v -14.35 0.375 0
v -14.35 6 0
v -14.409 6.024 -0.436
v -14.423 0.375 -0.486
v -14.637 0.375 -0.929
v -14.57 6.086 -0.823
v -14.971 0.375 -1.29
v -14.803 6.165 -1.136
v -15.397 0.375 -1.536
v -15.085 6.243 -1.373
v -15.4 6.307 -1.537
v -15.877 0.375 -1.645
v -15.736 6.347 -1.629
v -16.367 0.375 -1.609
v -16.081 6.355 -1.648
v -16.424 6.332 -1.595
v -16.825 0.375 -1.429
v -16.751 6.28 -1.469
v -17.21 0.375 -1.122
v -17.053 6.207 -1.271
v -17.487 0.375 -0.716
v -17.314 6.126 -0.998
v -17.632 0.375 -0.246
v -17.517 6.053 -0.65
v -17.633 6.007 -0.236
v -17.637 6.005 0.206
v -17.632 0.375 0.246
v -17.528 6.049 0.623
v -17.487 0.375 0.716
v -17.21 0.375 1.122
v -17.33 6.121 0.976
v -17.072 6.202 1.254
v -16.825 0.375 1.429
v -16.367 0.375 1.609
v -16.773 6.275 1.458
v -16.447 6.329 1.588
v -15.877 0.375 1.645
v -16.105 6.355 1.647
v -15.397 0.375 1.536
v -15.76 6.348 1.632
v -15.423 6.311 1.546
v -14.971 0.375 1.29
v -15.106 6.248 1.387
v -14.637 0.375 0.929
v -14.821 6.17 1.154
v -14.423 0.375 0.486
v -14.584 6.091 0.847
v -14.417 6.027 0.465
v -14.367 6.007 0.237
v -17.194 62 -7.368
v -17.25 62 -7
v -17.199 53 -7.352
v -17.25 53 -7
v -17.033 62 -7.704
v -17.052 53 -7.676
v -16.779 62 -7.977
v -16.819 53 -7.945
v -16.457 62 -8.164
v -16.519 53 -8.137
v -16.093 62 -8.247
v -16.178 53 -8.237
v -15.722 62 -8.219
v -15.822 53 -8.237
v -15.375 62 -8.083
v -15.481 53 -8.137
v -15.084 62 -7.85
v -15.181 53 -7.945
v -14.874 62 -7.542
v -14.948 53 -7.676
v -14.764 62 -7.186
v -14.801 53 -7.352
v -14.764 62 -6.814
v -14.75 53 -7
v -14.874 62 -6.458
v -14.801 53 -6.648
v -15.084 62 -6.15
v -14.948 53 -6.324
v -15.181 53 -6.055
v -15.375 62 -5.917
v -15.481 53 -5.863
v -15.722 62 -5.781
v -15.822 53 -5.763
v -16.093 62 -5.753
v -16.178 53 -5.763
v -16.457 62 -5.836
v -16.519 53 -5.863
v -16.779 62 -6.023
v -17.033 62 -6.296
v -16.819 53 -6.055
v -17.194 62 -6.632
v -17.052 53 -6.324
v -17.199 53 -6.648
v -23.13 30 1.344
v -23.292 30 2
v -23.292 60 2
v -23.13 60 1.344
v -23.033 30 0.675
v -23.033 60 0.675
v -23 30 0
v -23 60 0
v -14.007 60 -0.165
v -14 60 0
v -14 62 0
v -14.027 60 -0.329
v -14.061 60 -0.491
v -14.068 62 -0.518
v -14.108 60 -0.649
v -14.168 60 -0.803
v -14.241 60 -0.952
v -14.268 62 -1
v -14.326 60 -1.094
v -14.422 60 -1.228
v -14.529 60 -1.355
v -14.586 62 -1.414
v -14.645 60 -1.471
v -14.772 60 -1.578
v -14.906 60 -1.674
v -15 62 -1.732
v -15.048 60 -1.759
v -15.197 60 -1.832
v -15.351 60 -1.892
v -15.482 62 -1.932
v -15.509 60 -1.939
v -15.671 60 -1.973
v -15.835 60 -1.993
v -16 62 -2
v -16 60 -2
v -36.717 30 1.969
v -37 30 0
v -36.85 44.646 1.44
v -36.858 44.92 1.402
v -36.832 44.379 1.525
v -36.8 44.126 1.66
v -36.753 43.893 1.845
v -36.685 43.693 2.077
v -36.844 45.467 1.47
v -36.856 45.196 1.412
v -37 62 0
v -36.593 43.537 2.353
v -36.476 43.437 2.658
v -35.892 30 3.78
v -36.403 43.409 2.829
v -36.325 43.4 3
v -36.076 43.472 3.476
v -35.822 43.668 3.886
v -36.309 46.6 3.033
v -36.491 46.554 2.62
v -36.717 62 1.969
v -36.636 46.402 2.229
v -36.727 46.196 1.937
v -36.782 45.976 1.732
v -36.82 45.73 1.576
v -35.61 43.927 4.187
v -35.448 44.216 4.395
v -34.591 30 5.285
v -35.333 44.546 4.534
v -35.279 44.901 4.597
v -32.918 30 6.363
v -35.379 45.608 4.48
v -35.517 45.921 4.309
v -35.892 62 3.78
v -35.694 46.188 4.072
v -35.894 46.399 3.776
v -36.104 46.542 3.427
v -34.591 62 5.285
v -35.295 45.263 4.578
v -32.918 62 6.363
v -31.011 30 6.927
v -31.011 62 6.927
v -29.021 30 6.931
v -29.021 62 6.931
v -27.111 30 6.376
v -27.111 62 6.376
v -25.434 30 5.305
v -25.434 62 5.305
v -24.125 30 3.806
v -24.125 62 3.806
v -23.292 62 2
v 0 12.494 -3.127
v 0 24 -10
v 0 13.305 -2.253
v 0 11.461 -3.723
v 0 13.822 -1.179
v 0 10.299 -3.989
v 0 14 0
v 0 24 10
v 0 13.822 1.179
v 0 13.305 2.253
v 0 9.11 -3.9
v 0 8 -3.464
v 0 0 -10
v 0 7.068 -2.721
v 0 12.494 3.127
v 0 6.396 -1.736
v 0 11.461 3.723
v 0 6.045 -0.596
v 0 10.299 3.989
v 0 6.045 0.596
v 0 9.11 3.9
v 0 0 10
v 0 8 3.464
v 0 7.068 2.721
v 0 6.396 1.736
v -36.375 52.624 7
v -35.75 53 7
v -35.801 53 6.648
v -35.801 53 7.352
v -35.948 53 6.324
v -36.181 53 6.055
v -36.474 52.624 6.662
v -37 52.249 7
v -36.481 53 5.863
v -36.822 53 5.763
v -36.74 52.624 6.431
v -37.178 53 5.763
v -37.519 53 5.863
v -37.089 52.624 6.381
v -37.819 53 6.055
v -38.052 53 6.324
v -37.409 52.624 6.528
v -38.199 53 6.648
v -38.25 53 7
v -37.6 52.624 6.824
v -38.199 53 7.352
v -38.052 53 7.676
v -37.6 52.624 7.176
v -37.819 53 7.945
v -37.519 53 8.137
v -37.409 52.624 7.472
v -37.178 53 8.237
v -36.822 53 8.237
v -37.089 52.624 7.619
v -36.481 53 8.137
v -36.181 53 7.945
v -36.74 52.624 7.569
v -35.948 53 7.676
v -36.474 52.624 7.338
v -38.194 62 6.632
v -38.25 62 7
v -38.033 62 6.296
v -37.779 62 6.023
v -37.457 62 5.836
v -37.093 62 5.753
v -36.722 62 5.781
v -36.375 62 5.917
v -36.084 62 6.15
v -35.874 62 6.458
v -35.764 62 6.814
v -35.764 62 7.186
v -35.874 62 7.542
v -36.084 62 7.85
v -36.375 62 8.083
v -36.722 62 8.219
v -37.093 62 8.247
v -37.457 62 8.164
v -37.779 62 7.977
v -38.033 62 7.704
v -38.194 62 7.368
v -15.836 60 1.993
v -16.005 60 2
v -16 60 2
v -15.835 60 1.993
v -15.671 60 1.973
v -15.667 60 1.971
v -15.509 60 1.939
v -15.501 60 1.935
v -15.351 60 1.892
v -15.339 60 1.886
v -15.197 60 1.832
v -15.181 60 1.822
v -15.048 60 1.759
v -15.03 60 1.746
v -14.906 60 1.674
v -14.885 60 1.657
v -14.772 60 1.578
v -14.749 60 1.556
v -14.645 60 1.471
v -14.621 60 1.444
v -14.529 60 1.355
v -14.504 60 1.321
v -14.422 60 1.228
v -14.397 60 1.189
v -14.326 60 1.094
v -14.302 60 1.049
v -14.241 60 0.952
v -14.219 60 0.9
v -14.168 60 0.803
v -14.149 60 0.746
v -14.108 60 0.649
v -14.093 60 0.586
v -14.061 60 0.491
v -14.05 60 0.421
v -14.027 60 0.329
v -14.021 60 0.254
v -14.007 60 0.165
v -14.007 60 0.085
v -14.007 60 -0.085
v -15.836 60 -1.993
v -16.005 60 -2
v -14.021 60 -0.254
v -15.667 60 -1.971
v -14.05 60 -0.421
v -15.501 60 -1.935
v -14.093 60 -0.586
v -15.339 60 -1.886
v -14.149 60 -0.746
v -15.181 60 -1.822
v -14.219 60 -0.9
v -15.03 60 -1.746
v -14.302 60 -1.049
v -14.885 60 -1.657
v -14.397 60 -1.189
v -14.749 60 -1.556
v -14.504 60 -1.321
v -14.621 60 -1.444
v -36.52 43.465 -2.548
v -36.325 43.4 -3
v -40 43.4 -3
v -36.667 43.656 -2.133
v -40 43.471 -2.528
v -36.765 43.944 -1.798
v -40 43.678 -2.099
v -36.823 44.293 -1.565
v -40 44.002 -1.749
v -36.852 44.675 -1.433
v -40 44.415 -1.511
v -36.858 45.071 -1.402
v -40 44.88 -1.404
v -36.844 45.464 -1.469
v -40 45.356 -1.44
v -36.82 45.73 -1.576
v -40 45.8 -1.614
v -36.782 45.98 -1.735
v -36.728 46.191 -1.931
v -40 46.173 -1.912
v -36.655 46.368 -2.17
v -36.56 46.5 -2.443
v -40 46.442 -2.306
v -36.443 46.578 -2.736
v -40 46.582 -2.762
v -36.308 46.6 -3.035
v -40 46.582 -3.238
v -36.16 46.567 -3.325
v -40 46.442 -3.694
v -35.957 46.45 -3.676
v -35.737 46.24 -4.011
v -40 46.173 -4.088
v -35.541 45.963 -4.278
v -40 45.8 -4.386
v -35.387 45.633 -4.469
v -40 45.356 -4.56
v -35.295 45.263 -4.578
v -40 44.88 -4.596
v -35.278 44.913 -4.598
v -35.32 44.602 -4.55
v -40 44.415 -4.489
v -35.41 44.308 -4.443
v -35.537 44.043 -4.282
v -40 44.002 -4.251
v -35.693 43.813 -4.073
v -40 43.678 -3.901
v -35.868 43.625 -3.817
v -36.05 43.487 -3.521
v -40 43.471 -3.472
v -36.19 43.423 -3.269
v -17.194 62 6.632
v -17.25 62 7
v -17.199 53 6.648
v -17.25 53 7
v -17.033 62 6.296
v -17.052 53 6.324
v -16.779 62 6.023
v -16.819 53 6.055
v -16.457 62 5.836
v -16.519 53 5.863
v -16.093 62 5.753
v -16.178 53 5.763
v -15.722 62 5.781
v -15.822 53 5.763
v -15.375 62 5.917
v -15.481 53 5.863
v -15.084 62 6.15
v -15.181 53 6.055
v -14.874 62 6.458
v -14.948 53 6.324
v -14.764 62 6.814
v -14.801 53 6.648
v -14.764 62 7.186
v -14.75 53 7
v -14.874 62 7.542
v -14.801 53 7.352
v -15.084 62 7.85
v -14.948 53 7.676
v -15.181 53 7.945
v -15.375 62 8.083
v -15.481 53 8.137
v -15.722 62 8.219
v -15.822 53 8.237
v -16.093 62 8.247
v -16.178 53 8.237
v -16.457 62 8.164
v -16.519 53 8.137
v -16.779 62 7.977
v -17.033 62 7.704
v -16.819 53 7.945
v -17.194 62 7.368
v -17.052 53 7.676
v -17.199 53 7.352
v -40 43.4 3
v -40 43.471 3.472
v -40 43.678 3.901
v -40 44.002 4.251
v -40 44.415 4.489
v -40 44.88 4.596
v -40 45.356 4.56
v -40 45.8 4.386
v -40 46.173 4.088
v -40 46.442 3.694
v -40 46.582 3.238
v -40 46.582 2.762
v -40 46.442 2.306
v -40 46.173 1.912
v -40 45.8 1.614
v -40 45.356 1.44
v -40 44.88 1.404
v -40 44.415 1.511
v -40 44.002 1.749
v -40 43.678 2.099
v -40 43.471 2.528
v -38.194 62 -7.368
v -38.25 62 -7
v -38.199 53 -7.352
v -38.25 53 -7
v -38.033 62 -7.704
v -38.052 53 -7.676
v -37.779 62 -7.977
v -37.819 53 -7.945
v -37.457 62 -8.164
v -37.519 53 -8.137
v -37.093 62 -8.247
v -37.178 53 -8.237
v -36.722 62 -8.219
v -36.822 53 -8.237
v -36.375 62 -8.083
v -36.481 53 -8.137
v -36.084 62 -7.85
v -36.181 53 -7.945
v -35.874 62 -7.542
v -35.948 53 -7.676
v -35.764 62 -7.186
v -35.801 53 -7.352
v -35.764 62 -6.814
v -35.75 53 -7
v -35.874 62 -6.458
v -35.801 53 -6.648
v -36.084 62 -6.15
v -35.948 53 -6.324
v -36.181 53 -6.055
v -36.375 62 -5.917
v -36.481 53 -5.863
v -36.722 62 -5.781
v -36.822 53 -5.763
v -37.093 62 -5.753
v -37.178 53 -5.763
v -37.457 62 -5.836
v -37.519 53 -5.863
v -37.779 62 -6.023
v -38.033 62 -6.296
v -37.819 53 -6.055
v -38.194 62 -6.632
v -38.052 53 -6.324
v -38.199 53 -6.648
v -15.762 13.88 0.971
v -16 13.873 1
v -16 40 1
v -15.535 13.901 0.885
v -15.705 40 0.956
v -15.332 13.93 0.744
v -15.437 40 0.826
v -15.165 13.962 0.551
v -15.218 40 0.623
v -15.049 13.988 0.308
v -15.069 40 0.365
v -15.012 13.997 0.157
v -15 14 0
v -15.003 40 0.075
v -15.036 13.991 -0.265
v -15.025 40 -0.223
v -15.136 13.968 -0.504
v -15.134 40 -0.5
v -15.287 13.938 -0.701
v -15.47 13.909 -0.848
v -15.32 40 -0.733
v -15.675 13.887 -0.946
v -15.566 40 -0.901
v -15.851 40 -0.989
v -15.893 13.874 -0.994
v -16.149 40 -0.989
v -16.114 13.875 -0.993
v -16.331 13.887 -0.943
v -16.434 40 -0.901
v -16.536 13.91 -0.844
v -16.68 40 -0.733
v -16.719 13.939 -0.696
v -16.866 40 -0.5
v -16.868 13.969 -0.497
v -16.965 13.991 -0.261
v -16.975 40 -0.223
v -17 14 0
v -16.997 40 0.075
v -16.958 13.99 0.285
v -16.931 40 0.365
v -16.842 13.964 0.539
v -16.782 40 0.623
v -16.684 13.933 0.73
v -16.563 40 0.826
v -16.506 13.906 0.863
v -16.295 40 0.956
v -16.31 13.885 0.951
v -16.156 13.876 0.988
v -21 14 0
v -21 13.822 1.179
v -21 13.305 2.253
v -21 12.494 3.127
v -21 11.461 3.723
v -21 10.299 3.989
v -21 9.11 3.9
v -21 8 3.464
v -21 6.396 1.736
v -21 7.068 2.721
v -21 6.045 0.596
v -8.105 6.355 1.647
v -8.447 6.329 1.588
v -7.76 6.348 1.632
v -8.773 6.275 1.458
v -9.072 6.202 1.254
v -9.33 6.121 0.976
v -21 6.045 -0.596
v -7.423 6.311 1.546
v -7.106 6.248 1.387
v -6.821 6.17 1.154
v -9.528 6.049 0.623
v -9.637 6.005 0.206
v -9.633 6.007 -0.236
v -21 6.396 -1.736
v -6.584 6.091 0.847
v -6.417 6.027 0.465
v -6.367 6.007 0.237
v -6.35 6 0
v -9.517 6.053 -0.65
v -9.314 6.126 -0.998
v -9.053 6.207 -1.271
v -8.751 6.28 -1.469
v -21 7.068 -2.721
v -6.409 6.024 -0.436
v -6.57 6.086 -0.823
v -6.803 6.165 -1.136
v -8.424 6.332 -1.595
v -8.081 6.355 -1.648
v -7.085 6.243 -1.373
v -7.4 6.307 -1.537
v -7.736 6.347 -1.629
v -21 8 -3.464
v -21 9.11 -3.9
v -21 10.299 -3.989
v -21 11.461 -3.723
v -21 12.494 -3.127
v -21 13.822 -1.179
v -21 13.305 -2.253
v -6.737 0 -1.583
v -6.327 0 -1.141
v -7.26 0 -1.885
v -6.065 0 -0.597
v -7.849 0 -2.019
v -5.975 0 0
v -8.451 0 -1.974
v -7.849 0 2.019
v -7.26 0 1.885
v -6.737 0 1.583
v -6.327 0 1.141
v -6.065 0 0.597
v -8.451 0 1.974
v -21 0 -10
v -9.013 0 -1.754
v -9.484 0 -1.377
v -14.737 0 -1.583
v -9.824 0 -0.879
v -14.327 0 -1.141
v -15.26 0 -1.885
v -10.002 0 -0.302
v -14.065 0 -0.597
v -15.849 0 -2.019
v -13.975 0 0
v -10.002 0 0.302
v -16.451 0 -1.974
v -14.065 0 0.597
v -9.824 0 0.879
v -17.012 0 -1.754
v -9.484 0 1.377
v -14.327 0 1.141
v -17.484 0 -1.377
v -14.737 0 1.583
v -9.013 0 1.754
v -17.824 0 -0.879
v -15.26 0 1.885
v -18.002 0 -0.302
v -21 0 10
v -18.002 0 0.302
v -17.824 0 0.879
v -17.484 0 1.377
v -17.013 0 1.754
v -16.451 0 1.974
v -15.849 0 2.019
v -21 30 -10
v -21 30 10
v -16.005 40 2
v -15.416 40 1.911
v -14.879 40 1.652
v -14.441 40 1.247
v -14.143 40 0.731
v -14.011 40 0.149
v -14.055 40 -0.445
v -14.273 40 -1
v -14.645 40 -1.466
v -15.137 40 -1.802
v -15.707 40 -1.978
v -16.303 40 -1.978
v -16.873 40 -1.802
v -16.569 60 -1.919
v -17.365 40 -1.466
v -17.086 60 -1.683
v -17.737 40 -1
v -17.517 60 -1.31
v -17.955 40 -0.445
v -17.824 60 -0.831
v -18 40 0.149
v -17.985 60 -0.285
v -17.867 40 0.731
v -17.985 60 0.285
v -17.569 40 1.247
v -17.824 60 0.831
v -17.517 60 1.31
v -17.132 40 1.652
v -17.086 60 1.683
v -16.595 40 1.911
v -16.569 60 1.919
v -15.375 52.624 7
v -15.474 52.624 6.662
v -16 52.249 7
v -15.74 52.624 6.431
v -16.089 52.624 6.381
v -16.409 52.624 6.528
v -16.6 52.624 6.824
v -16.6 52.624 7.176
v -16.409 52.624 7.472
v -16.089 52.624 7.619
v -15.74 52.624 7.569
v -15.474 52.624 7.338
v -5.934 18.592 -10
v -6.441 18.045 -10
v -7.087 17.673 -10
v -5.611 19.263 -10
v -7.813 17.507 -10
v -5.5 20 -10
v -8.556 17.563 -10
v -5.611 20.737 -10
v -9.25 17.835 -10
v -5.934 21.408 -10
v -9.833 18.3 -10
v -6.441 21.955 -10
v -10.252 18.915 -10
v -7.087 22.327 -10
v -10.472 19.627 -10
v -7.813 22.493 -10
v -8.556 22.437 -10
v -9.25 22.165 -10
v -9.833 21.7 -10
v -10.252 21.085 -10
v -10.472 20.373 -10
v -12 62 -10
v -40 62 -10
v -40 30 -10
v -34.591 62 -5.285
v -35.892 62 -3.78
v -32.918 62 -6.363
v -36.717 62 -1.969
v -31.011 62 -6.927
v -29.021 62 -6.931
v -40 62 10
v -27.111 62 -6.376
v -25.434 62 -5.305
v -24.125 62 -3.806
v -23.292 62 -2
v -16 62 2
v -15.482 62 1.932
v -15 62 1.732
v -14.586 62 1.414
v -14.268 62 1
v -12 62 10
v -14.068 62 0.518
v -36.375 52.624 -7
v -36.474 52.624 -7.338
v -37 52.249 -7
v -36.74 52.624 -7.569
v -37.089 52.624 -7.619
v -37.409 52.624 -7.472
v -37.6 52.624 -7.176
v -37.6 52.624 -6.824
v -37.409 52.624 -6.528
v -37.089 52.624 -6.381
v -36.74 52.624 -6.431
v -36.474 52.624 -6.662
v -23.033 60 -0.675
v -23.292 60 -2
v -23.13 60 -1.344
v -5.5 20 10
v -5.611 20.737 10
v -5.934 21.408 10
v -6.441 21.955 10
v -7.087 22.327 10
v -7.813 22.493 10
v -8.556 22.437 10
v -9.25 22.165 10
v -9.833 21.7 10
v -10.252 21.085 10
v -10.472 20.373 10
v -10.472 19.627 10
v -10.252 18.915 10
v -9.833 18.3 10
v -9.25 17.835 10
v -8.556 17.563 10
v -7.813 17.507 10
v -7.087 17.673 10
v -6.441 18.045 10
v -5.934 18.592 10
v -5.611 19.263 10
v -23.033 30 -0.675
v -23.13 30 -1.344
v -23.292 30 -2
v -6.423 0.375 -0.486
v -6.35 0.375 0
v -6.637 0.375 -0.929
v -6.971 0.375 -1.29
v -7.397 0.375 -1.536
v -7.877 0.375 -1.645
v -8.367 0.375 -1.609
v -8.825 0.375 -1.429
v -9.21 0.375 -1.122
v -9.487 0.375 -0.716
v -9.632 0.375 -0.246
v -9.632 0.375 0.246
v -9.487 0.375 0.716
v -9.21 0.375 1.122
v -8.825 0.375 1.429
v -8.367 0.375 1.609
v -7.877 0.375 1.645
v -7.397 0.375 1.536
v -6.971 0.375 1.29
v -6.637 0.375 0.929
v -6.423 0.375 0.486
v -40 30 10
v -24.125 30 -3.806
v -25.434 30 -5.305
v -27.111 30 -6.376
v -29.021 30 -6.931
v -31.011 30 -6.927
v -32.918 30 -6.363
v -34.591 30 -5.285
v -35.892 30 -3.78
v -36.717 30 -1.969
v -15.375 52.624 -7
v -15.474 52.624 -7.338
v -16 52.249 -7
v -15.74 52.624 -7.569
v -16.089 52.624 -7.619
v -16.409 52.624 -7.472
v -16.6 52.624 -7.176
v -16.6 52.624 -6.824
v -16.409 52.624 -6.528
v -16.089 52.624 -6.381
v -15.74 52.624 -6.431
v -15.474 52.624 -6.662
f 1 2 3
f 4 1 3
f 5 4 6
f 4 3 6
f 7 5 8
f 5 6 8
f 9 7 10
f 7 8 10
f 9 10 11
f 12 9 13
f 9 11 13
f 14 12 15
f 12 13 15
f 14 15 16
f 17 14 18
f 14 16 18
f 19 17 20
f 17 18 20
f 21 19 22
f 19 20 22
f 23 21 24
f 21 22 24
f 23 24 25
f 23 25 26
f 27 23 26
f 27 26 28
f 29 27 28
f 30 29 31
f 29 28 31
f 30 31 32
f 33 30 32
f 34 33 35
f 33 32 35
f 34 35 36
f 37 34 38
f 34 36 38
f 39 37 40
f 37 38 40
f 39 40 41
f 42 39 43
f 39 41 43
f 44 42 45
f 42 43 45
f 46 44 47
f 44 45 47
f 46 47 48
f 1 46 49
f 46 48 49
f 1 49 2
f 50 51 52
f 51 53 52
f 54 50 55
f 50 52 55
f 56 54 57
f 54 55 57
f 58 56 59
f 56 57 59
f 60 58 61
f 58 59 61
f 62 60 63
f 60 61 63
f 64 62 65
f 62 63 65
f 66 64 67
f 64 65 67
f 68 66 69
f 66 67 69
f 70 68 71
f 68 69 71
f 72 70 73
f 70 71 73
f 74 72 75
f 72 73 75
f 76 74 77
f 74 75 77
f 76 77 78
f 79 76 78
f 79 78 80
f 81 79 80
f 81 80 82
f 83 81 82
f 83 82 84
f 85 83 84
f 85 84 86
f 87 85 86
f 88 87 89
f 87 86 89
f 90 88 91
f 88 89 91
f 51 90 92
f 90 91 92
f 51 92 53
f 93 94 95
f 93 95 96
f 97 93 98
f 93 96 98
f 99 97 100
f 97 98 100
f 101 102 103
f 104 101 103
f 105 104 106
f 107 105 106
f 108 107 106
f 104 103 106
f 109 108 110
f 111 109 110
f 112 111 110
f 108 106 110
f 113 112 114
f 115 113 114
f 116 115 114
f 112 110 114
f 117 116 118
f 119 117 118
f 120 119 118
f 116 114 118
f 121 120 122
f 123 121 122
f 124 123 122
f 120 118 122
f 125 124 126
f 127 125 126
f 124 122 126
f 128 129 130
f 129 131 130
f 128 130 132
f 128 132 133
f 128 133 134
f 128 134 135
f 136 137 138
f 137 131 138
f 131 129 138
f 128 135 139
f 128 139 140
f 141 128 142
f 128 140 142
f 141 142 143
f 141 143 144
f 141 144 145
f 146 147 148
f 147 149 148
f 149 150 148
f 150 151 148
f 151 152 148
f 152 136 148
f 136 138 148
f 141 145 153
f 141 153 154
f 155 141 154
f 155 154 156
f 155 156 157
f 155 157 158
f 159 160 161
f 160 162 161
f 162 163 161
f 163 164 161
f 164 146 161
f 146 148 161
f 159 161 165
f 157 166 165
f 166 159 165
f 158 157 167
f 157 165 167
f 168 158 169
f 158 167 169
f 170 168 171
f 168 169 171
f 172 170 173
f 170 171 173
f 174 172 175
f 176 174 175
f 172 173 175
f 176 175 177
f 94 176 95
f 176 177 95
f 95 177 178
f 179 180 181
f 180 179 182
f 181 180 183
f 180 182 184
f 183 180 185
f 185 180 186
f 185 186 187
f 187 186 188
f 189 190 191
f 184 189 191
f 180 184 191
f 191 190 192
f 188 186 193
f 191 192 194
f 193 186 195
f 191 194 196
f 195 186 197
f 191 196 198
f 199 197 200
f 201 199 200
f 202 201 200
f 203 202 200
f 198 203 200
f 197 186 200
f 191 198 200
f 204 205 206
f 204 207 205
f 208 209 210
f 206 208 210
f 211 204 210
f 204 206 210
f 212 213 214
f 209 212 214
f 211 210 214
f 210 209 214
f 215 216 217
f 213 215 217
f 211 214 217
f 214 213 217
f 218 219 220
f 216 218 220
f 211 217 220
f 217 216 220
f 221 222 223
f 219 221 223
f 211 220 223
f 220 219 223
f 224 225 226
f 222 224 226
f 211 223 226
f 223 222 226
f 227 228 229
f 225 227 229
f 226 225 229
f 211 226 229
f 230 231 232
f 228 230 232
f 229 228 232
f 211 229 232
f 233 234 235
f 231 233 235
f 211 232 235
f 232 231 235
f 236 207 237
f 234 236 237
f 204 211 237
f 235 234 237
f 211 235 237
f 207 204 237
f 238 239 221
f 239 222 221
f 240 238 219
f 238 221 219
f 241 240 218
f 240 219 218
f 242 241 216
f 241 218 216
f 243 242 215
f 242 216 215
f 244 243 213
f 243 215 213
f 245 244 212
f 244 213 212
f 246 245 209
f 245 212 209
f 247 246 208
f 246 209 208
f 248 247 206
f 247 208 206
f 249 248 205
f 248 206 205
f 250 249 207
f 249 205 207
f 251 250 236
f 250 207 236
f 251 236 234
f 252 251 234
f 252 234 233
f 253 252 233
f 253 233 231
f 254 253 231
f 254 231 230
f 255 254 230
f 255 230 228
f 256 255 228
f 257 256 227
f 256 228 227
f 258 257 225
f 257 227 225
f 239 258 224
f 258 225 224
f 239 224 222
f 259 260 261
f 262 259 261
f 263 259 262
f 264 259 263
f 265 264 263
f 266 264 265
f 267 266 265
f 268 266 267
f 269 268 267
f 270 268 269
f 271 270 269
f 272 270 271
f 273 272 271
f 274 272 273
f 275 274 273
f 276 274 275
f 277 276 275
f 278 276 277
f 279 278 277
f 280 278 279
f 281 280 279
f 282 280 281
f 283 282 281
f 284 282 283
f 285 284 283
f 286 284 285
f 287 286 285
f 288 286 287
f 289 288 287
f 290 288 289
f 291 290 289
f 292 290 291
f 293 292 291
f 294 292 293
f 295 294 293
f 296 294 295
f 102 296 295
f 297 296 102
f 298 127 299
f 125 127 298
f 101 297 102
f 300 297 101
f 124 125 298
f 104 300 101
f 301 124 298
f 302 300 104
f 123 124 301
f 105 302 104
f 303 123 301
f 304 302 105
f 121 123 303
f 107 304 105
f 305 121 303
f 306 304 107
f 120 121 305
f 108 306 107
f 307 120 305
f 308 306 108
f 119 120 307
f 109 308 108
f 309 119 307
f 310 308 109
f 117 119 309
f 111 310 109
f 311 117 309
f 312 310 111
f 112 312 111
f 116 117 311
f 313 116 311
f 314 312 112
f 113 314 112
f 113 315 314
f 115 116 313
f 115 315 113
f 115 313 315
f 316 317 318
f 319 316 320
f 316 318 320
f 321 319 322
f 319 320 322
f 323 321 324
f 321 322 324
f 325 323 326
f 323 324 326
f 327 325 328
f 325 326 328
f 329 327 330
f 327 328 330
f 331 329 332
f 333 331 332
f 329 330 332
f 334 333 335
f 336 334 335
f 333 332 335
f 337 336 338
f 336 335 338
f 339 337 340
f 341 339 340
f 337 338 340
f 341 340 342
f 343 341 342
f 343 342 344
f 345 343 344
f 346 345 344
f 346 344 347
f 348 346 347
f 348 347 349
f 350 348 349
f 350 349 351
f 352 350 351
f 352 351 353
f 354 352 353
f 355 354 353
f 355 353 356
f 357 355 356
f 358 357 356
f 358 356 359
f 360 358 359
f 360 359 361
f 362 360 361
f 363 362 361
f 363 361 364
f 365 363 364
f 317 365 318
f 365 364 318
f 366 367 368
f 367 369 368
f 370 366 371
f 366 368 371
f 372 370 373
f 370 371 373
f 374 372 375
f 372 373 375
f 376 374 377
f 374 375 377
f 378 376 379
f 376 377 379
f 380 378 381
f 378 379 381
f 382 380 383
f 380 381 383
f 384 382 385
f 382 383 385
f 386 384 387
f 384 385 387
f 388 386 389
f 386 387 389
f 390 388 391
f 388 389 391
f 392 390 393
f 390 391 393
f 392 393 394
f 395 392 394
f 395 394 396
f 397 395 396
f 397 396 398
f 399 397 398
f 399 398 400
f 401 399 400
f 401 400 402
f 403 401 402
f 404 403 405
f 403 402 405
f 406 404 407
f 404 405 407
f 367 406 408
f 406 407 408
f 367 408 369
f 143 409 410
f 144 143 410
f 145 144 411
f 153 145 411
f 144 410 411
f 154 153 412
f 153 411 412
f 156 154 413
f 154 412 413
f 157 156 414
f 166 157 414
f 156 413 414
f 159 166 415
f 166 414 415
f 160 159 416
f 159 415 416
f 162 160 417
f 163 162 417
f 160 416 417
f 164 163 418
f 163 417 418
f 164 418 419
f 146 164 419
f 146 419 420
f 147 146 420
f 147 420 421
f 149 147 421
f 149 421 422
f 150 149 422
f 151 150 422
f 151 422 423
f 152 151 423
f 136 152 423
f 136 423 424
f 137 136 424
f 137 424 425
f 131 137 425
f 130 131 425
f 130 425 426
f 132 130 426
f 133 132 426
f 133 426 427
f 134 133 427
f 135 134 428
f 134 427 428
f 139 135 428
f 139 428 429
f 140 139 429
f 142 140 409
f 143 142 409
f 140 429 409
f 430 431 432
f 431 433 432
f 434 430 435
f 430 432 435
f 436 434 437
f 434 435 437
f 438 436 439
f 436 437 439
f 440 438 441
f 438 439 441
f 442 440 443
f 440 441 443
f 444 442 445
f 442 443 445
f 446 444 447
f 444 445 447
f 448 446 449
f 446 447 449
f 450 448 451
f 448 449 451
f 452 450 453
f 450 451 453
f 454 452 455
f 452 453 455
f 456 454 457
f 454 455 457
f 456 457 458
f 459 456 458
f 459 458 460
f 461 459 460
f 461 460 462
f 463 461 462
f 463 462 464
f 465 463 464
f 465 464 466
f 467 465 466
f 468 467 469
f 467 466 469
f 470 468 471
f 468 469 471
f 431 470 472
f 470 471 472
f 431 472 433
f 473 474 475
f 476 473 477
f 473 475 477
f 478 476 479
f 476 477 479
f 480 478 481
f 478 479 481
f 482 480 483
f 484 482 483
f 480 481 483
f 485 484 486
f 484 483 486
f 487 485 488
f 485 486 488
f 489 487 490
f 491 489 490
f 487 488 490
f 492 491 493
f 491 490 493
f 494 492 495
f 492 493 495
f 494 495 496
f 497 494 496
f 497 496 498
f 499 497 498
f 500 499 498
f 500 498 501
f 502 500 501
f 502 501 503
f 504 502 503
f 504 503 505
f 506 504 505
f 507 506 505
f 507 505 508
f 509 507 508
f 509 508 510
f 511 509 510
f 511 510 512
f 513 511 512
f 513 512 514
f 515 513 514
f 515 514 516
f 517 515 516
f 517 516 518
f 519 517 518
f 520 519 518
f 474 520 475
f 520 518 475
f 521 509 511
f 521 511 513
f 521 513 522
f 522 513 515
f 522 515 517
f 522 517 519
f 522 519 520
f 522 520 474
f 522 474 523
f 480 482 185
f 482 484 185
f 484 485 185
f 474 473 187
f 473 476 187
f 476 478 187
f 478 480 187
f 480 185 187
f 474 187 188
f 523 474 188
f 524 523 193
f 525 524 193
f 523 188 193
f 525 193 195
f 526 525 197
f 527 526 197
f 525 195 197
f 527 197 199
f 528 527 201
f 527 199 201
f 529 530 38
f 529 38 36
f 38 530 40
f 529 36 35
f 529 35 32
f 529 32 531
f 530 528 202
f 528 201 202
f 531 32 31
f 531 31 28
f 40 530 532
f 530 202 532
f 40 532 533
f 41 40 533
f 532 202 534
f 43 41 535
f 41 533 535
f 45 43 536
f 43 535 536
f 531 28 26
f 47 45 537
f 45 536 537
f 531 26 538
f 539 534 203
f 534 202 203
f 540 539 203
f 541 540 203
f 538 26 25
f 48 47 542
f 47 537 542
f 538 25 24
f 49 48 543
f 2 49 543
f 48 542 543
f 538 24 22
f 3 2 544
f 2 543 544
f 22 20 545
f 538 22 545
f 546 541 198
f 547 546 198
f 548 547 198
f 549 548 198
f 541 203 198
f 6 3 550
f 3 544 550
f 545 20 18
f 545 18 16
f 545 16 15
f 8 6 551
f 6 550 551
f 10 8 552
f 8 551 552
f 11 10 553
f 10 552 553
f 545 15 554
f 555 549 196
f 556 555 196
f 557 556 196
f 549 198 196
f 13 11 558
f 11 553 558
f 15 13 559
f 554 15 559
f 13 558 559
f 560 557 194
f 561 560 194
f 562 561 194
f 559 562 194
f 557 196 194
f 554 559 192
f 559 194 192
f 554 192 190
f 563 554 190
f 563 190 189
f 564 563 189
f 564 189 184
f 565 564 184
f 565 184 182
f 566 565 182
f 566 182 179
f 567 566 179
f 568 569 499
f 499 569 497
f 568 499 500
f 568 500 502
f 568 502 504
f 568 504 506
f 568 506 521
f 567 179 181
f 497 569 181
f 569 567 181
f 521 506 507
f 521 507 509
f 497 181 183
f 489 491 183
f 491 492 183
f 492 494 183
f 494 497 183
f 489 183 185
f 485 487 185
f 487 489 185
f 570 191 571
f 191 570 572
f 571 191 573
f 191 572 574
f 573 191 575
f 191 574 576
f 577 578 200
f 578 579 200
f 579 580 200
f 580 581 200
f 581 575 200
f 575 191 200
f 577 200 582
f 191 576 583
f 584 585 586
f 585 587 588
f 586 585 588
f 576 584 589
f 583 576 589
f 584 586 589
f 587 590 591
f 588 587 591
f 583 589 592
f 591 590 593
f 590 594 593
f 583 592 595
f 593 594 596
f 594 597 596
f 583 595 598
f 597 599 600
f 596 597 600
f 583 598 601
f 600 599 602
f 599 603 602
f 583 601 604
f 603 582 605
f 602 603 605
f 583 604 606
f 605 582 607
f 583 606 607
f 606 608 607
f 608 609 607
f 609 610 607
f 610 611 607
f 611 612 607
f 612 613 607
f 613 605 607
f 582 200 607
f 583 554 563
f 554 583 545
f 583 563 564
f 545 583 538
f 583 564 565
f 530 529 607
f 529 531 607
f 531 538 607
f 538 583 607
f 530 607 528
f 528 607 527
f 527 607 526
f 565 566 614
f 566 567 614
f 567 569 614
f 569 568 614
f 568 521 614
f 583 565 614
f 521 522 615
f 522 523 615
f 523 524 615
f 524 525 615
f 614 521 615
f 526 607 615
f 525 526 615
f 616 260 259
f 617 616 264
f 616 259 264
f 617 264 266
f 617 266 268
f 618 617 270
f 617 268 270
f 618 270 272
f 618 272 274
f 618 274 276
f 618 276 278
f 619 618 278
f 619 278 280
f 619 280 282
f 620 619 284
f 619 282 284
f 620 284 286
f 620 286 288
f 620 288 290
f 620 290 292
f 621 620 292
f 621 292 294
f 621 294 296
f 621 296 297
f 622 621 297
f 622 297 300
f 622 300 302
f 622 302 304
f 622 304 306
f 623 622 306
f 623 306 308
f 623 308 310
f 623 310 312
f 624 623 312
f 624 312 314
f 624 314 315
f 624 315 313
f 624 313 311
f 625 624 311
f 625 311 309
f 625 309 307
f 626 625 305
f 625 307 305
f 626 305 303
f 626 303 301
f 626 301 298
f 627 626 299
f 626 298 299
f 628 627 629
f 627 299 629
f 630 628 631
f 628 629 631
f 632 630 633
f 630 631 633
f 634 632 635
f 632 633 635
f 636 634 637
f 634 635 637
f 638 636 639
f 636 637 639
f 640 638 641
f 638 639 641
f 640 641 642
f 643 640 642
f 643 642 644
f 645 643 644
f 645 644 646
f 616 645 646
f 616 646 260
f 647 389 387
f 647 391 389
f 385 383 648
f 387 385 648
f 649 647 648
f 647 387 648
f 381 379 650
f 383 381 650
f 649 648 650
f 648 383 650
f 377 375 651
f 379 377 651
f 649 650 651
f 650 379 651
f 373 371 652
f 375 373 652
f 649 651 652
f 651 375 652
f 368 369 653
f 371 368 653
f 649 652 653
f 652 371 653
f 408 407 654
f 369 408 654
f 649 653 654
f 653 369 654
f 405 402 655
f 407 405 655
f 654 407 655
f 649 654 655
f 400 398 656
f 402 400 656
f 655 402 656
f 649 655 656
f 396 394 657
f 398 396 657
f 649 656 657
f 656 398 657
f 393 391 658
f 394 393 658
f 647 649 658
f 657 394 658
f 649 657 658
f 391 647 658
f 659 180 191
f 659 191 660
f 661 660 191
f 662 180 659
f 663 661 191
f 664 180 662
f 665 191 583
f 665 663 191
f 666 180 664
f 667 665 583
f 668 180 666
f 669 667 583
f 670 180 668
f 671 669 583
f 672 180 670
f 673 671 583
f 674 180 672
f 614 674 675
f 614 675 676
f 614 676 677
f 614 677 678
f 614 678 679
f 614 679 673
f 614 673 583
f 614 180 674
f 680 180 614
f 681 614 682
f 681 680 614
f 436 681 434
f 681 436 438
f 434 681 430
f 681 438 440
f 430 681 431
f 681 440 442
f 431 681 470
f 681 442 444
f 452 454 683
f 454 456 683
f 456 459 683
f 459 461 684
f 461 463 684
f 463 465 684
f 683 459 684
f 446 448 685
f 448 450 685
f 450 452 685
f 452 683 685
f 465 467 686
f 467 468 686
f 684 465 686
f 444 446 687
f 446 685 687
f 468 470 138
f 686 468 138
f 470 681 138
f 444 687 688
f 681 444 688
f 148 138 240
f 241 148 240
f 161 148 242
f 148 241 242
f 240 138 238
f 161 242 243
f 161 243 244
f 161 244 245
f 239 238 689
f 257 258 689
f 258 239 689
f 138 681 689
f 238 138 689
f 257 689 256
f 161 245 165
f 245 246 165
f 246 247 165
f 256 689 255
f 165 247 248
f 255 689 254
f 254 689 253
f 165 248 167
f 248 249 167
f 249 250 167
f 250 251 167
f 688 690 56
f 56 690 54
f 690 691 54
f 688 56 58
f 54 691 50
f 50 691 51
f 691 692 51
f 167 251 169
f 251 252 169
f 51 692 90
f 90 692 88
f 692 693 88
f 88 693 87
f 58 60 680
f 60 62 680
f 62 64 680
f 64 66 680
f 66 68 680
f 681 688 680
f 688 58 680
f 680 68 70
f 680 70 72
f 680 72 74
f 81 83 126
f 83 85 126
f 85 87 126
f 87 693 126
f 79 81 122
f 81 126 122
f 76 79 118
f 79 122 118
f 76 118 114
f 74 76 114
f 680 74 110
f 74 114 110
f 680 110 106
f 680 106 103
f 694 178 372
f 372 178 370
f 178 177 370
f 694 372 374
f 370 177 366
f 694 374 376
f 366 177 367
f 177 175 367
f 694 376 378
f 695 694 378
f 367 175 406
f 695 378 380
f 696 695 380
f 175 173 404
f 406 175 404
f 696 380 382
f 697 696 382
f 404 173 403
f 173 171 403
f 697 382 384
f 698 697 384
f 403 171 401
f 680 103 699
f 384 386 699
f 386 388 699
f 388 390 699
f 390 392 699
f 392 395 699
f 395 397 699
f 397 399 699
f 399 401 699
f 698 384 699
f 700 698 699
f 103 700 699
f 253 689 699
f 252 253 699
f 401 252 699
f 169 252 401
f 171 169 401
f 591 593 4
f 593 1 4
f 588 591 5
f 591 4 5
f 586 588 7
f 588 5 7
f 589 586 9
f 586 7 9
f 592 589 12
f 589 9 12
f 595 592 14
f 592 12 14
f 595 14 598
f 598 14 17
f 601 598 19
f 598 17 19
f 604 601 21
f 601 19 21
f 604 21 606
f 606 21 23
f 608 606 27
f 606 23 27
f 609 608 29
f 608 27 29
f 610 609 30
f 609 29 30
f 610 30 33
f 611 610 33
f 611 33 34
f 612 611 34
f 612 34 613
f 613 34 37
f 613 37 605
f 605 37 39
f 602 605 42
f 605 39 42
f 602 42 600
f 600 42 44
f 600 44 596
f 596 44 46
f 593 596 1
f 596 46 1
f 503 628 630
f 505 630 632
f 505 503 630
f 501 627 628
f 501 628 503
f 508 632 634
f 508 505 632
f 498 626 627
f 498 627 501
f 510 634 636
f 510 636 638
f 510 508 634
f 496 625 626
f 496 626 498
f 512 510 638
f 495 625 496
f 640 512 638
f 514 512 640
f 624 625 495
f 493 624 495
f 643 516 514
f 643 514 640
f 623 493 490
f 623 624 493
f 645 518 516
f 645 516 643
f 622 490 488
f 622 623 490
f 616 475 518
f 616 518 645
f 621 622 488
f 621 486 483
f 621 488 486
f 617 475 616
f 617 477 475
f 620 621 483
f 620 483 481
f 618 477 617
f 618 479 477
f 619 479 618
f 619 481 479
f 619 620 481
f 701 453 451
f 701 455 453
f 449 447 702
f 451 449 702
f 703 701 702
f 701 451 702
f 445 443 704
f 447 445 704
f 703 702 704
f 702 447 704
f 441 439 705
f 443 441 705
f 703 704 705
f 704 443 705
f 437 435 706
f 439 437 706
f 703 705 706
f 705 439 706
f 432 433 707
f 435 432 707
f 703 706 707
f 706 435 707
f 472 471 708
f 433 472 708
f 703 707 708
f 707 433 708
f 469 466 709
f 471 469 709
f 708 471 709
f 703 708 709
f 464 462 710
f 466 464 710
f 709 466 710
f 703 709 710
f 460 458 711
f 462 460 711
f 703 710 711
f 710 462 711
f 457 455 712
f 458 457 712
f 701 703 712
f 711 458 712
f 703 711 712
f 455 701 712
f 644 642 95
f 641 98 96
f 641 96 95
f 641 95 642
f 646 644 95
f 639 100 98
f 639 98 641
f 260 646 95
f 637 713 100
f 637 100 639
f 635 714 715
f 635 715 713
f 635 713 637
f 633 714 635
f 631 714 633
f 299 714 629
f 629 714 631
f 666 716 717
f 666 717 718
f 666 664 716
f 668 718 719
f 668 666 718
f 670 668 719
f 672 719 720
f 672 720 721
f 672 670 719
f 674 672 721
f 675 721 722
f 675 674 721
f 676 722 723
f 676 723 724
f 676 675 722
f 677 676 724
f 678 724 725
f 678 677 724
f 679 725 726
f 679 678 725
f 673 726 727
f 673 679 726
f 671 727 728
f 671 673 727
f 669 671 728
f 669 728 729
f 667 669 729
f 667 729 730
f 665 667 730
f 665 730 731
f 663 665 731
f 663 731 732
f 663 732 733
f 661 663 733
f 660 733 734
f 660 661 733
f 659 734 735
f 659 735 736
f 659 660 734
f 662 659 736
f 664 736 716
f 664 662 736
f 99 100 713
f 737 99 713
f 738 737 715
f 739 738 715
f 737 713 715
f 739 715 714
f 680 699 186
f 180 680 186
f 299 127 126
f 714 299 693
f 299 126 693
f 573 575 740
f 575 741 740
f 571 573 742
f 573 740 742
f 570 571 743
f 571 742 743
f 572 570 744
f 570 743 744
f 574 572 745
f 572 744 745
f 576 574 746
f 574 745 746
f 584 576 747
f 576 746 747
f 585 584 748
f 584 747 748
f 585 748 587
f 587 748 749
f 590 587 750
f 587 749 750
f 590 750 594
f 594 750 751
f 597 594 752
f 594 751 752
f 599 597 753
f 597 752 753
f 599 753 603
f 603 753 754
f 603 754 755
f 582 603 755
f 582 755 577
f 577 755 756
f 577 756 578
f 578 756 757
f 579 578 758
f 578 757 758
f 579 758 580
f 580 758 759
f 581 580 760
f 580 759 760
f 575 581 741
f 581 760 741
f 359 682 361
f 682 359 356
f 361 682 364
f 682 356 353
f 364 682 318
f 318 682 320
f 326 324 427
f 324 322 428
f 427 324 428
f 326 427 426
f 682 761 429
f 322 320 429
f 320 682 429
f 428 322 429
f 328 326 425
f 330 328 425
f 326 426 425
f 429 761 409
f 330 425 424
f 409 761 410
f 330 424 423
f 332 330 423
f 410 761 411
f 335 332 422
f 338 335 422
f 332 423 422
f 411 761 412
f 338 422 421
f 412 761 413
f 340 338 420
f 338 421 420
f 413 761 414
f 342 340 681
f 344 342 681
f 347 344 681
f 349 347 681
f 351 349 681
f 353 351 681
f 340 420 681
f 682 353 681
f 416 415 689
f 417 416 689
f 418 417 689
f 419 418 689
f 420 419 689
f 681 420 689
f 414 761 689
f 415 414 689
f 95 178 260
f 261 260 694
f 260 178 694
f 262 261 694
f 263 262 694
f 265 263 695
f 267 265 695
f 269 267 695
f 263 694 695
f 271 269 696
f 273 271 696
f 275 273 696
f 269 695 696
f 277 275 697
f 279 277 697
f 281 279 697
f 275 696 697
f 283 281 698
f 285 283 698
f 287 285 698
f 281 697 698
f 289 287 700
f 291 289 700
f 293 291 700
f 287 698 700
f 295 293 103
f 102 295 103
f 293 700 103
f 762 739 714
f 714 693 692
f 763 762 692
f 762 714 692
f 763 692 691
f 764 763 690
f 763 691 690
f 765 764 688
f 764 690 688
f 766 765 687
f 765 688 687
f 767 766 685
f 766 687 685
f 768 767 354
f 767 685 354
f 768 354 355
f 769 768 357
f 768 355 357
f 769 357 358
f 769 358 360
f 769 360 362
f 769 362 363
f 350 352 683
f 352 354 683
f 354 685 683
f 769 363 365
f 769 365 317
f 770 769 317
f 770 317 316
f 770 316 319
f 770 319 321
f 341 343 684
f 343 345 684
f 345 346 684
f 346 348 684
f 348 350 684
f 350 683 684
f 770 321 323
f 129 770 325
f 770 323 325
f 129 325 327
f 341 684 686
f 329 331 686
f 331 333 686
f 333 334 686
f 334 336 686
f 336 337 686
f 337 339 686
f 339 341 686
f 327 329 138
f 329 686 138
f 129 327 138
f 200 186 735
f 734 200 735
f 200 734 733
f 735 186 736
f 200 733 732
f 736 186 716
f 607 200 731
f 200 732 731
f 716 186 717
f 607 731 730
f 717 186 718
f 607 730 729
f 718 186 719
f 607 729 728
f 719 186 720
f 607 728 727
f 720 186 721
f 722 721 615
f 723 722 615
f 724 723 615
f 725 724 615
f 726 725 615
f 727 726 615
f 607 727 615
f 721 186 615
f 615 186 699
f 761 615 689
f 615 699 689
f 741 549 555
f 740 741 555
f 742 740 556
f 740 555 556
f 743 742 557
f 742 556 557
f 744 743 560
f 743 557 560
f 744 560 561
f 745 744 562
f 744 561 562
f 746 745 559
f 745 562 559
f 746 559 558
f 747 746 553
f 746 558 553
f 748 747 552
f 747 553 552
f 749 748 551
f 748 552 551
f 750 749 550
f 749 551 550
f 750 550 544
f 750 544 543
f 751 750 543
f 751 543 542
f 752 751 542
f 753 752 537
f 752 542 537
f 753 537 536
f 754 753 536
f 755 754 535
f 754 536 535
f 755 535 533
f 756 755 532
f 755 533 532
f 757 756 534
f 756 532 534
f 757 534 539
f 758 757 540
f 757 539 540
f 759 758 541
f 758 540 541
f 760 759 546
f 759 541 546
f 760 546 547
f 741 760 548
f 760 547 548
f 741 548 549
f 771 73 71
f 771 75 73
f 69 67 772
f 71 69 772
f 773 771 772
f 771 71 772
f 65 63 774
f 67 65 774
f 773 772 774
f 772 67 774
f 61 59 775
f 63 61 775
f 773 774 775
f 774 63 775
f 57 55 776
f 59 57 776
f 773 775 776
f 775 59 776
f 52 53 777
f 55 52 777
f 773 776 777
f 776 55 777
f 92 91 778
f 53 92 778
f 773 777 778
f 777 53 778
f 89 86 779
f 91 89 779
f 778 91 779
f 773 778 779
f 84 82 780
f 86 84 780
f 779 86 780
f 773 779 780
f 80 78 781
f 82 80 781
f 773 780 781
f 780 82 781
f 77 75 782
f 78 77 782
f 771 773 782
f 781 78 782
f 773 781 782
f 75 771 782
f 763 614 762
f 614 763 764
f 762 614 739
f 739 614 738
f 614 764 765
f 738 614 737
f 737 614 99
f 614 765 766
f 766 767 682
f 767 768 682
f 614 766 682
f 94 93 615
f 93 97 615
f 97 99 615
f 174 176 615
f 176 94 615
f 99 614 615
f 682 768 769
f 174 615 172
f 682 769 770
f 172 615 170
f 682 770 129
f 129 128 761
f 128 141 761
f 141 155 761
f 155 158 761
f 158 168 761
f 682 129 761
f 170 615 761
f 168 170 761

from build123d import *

# Parameters (mm, degrees)
SKETCH1_R             = 2.5
BOSS_EXTRUDE1_DEPTH   = 10
CUT_EXTRUDE1_DEPTH    = 75.458041876
CUT_EXTRUDE2_DEPTH    = 2
M3_TAPPED_HOLE1_D     = 2.5
M3_TAPPED_HOLE1_DEPTH = 9
M3_TAPPED_HOLE1_TIP   = 0.751075774
SKETCH6_R             = 4
CUT_EXTRUDE3_DEPTH    = 75.458041876
SKETCH10_R            = 1.6
CUT_EXTRUDE4_DEPTH    = 8
SKETCH11_R            = 2
CUT_EXTRUDE5_DEPTH    = 20
SKETCH12_R            = 1
CUT_EXTRUDE6_DEPTH    = 29


# Read off the part's stored shape, not the designer's step: M4 Tapped Hole1
with BuildPart() as part:
    # Sketch1 → Boss-Extrude1 (new, symmetric)
    with BuildSketch(Plane.XY):
        Polygon((0, 0), (-21, 0), (-21, 30), (-40, 30), (-40, 62), (-12, 62), (0, 24), align=None)
        with Locations((-8, 20)):
            Circle(SKETCH1_R, mode=Mode.SUBTRACT)
    extrude(amount=BOSS_EXTRUDE1_DEPTH, both=True)

    # Sketch2 → Cut-Extrude1 (cut, through all)
    with BuildSketch(Plane(origin=(0, 62, 0), x_dir=(1, 0, 0), z_dir=(0, 1, 0))):
        with BuildLine():
            ThreePointArc((-23.291796068, -2), (-23.073333142, -1.010587075), (-23, 0))
            Line((-23, 0), (-37, 0))
            ThreePointArc((-37, 0), (-31.010587075, -6.926666858), (-23.291796068, -2))
        make_face()
        with BuildLine():
            Line((-37, 0), (-23, 0))
            ThreePointArc((-23, 0), (-23.073333142, 1.010587075), (-23.291796068, 2))
            ThreePointArc((-23.291796068, 2), (-31.010587075, 6.926666858), (-37, 0))
        make_face()
    extrude(amount=-CUT_EXTRUDE1_DEPTH, mode=Mode.SUBTRACT)

    # Sketch2<3> → Cut-Extrude2 (cut)
    with BuildSketch(Plane(origin=(0, 62, 0), x_dir=(1, 0, 0), z_dir=(0, 1, 0))):
        with BuildLine():
            ThreePointArc((-16, -2), (-17.414213562, -1.414213562), (-18, 0))
            Line((-18, 0), (-23, 0))
            ThreePointArc((-23, 0), (-23.073333142, -1.010587075), (-23.291796068, -2))
            Line((-23.291796068, -2), (-16, -2))
        make_face()
        with BuildLine():
            Line((-23, 0), (-18, 0))
            ThreePointArc((-18, 0), (-17.414213562, 1.414213562), (-16, 2))
            Line((-16, 2), (-23.291796068, 2))
            ThreePointArc((-23.291796068, 2), (-23.073333142, 1.010587075), (-23, 0))
        make_face()
        with BuildLine():
            ThreePointArc((-16, -2), (-14.585786438, -1.414213562), (-14, 0))
            Line((-14, 0), (-18, 0))
            ThreePointArc((-18, 0), (-17.414213562, -1.414213562), (-16, -2))
        make_face()
        with BuildLine():
            Line((-18, 0), (-14, 0))
            ThreePointArc((-14, 0), (-14.585786438, 1.414213562), (-16, 2))
            ThreePointArc((-16, 2), (-17.414213562, 1.414213562), (-18, 0))
        make_face()
    extrude(amount=-CUT_EXTRUDE2_DEPTH, mode=Mode.SUBTRACT)

    # M3 Tapped Hole1
    with Locations(Plane(origin=(0, 62, 0), x_dir=(1, 0, 0), z_dir=(0, 1, 0))):
        with Locations((-37, 7), (-37, -7), (-16, -7), (-16, 7)):
            Hole(M3_TAPPED_HOLE1_D / 2, depth=M3_TAPPED_HOLE1_DEPTH)
            with Locations((0, 0, -(M3_TAPPED_HOLE1_DEPTH + M3_TAPPED_HOLE1_TIP / 2))):  # 118° drill point
                Cone(0, M3_TAPPED_HOLE1_D / 2, M3_TAPPED_HOLE1_TIP, mode=Mode.SUBTRACT)

    # Sketch6 → Cut-Extrude3 (cut, through all)
    with BuildSketch(Plane(origin=(0, 0, 0), x_dir=(0, 0, -1), z_dir=(1, 0, 0))):
        with Locations(Location((0, 10, 0), (0, 0, 90))):
            Circle(SKETCH6_R)
    extrude(amount=-CUT_EXTRUDE3_DEPTH, mode=Mode.SUBTRACT)

    # M4 Tapped Hole1 outline → M4 Tapped Hole1 (revolve, cut)
    with BuildSketch(Plane(origin=(-16, 0, 0), x_dir=(1, 0, 0), z_dir=(0, 0, 1))):
        Polygon((1.65, 0.375), (1.65, 6.356330866), (0, 6.356330866), (0, 0), (2.025, 0), align=None)
    revolve(axis=Axis((-16, 0, 0), (0, 1, 0)), mode=Mode.SUBTRACT)

    # M4 Tapped Hole1 2 outline → M4 Tapped Hole1 2 (revolve, cut)
    with BuildSketch(Plane(origin=(-8, 0, 0), x_dir=(1, 0, 0), z_dir=(0, 0, 1))):
        Polygon((1.65, 0.375), (1.65, 6.356330866), (0, 6.356330866), (0, 0), (2.025, 0), align=None)
    revolve(axis=Axis((-8, 0, 0), (0, 1, 0)), mode=Mode.SUBTRACT)

    # Sketch10 → Cut-Extrude4 (cut)
    with BuildSketch(Plane.ZY.offset(40)):
        with Locations(Location((-3, 45, 0), (0, 0, 270))):
            Circle(SKETCH10_R)
        with Locations(Location((3, 45, 0), (0, 0, 270))):
            Circle(SKETCH10_R)
    extrude(amount=-CUT_EXTRUDE4_DEPTH, mode=Mode.SUBTRACT)

    # Sketch11 → Cut-Extrude5 (cut)
    with BuildSketch(Plane(origin=(0, 60, 0), x_dir=(1, 0, 0), z_dir=(0, 1, 0))):
        with Locations(Location((-16.005152977, 0, 0), (0, 0, 270))):
            Circle(SKETCH11_R)
    extrude(amount=-CUT_EXTRUDE5_DEPTH, mode=Mode.SUBTRACT)

    # Sketch12 → Cut-Extrude6 (cut)
    with BuildSketch(Plane(origin=(0, 40, 0), x_dir=(1, 0, 0), z_dir=(0, 1, 0))):
        with Locations(Location((-16, 0, 0), (0, 0, 270))):
            Circle(SKETCH12_R)
    extrude(amount=-CUT_EXTRUDE6_DEPTH, mode=Mode.SUBTRACT)


solid = part.part
